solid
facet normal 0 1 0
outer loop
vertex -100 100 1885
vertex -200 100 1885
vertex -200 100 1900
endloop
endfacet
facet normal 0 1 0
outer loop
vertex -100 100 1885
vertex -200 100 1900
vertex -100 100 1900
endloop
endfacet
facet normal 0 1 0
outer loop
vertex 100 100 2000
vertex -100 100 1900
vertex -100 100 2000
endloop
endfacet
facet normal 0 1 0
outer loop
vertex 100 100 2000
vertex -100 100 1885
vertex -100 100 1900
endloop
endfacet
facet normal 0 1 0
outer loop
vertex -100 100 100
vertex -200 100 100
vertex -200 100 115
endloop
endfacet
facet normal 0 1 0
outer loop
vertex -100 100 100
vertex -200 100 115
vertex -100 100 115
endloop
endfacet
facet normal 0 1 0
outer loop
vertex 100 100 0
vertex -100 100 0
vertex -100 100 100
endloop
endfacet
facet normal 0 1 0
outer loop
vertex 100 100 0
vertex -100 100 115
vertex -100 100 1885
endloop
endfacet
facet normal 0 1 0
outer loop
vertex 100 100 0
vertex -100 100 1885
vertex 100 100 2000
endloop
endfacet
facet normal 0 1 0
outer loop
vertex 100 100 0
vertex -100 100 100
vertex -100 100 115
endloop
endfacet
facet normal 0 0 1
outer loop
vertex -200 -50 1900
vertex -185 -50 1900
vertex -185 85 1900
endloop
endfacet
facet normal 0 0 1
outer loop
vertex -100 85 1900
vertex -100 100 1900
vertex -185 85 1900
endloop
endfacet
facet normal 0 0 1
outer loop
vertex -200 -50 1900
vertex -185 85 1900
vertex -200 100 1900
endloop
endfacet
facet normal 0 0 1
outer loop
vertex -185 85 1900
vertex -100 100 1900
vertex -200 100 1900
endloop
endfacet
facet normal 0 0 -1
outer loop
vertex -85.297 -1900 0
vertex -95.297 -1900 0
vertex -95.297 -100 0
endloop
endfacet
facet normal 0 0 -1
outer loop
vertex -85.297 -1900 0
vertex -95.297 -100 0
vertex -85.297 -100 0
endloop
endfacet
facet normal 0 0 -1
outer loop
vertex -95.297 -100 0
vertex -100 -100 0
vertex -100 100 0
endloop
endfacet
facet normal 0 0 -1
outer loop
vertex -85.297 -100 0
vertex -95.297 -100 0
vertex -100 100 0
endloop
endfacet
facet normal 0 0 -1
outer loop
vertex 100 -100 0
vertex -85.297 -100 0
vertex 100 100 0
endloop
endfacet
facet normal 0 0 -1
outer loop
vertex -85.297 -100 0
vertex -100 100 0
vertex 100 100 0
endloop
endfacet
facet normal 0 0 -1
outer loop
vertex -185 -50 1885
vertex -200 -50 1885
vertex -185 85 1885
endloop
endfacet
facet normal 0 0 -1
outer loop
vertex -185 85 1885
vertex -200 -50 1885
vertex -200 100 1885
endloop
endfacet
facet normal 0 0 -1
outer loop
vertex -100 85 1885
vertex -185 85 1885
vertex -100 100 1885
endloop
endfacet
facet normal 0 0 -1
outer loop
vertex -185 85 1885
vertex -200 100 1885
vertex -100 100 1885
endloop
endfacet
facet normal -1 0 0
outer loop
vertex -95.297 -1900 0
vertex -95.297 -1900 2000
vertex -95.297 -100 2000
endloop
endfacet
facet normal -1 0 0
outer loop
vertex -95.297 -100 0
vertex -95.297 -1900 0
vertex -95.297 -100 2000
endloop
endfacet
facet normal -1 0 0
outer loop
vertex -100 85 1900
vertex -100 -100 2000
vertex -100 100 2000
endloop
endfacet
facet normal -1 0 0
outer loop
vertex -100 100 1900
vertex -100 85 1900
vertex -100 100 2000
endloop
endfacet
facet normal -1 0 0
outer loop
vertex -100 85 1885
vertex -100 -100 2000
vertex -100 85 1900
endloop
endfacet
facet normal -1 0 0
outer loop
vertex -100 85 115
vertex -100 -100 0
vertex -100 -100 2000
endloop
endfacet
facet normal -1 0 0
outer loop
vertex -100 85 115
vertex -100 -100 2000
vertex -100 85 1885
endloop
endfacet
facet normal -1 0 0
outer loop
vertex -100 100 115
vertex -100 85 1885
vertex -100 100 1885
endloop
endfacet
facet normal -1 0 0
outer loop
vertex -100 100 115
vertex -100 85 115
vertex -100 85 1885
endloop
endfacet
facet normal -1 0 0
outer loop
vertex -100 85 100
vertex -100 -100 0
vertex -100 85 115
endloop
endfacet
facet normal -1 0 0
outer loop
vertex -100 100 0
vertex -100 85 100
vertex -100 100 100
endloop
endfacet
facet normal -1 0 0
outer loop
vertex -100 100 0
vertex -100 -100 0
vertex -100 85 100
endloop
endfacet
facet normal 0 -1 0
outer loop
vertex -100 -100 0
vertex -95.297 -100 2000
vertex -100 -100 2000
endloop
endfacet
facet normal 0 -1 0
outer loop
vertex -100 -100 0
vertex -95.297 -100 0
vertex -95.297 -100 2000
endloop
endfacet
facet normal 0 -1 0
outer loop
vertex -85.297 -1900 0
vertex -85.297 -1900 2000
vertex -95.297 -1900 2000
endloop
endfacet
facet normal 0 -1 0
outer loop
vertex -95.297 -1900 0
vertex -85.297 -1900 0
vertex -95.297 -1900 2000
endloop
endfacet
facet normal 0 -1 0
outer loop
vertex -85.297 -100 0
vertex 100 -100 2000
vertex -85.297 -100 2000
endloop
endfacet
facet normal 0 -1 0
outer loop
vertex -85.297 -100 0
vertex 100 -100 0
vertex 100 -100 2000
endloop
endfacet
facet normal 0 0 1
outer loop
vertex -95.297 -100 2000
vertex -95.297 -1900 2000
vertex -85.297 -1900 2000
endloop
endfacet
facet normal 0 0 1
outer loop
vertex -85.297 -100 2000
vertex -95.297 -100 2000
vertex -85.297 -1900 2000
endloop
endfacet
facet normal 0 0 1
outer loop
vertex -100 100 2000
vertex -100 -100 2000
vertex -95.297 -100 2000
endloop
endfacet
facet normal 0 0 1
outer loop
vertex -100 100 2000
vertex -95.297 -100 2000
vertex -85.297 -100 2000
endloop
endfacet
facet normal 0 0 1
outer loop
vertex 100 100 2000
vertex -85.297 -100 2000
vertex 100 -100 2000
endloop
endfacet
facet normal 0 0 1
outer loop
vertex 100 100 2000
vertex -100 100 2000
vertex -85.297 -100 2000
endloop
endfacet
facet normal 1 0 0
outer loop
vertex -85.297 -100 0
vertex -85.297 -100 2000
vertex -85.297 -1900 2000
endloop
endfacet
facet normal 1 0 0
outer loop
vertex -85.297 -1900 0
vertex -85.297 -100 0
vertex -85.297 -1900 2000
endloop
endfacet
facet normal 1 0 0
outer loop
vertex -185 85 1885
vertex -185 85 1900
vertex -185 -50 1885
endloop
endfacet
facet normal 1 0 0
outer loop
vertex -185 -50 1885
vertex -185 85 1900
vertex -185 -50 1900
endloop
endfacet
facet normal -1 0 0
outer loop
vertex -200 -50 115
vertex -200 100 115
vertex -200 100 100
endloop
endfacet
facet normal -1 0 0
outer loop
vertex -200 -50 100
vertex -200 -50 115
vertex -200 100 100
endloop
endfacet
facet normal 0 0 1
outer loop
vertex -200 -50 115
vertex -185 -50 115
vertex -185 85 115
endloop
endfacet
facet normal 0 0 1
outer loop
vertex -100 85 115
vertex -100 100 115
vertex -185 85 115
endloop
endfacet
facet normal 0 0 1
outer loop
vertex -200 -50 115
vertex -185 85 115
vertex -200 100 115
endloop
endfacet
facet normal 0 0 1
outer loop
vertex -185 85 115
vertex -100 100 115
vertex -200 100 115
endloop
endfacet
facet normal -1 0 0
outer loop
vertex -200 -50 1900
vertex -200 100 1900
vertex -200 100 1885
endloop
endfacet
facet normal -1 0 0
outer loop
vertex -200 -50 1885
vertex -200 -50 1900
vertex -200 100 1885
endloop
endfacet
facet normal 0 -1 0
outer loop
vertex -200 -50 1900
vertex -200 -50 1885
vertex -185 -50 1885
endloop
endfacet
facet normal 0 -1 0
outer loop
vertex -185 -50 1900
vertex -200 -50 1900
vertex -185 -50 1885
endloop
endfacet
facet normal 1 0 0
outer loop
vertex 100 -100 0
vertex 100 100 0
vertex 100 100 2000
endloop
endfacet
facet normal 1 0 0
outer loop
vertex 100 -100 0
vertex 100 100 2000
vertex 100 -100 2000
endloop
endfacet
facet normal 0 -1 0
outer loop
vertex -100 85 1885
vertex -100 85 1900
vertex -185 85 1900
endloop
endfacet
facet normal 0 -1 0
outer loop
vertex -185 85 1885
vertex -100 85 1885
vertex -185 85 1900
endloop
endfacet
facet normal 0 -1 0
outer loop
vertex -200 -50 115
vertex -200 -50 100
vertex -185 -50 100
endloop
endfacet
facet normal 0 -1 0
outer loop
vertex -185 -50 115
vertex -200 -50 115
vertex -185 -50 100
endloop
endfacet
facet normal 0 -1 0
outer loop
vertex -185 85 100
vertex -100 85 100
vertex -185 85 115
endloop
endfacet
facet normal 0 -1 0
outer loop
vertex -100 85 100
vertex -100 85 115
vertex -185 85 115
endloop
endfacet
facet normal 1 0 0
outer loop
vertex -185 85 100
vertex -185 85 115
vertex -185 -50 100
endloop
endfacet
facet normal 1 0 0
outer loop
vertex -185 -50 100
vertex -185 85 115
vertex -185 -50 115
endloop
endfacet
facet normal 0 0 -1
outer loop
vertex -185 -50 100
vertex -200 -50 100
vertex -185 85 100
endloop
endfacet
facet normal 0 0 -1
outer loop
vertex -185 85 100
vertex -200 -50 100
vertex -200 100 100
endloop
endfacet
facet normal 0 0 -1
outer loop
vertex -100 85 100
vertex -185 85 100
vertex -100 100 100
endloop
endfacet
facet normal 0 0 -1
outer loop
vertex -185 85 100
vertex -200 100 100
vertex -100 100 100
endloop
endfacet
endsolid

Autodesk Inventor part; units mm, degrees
ref_plane "YZ Plane" through (0, 0, 0) normal (1, 0, 0) x (0, 1, 0)
ref_plane "XZ Plane" through (0, 0, 0) normal (0, 1, 0) x (-1, 0, 0)
ref_plane "XY Plane" through (0, 0, 0) normal (0, 0, 1) x (1, 0, 0)
sketch "Esquisse1" plane through (0, 0, 0) normal (0, 0, 1) x (1, 0, 0)
  line L0 (-100, 100) -> (100, 100)
  line L1 (100, 100) -> (100, -100)
  line L2 (100, -100) -> (-100, -100)
  line L3 (-100, -100) -> (-100, 100)
  line L4 (-95.2971, -100) -> (-85.2971, -100)
  line L5 (-85.2971, -100) -> (-85.2971, -1900)
  line L6 (-85.2971, -1900) -> (-95.2971, -1900)
  line L7 (-95.2971, -1900) -> (-95.2971, -100)
  point P0 (0, 0)
  dimension "d0" = 200
  dimension "d1" = 200
  dimension "d2" = 100
  dimension "d3" = 100
  dimension "d4" = 1800
  dimension "d5" = 10
extrude "Extrusion1" add sketch "Esquisse1" along normal blind 2000
sketch "Esquisse2" plane through (-100, 100, 0) normal (0, 1, 0) x (1, 0, 0)
  line L0 (14.7029, 0) -> (14.7029, -2000) projected
  line L1 (14.7029, -1926.0048) -> (14.7029, -1942.8259)
  line L2 (4.7029, 0) -> (4.7029, -2000) projected
  line L3 (4.7029, -126.1575) -> (4.7029, -105.1313)
  line L4 (0, 0) -> (0, -2000) projected
  line L5 (0, -1900) -> (-100, -1900)
  line L6 (-100, -1900) -> (-100, -1885)
  line L7 (-100, -1885) -> (0, -1885)
  line L8 (0, -1885) -> (0, -1900)
  line L9 (0, -115) -> (-100, -115)
  line L10 (-100, -115) -> (-100, -100)
  line L11 (-100, -100) -> (0, -100)
  line L12 (0, -100) -> (0, -115)
  point P0 (100, 0)
  dimension "d8" = 100
  dimension "d9" = 15
  dimension "d10" = 100
  dimension "d11" = 100
  dimension "d12" = 15
  dimension "d13" = 100
extrude "Extrusion2" add sketch "Esquisse2" against normal blind 150
sketch "Esquisse3" plane through (-200, 100, 1900) normal (0, 0, 1) x (1, 0, 0)
  line L0 (0, -150) -> (100, -150) projected
  line L1 (100, 0) -> (100, -200) projected
  line L2 (15, -150) -> (100, -150)
  line L3 (100, -150) -> (100, -15)
  line L4 (100, -15) -> (15, -15)
  line L5 (15, -15) -> (15, -150)
  line L6 (0, 0) -> (100, 0) projected
  point P0 (200, -100)
  dimension "d16" = 15
  dimension "d17" = 15
extrude "Extrusion3" cut sketch "Esquisse3" against normal through all
equation "\"d2\" = 0.5 * d1"
equation "\"d3\" = 0.5 * d0"
properties part number "Ecran_Videoprojecteur"
